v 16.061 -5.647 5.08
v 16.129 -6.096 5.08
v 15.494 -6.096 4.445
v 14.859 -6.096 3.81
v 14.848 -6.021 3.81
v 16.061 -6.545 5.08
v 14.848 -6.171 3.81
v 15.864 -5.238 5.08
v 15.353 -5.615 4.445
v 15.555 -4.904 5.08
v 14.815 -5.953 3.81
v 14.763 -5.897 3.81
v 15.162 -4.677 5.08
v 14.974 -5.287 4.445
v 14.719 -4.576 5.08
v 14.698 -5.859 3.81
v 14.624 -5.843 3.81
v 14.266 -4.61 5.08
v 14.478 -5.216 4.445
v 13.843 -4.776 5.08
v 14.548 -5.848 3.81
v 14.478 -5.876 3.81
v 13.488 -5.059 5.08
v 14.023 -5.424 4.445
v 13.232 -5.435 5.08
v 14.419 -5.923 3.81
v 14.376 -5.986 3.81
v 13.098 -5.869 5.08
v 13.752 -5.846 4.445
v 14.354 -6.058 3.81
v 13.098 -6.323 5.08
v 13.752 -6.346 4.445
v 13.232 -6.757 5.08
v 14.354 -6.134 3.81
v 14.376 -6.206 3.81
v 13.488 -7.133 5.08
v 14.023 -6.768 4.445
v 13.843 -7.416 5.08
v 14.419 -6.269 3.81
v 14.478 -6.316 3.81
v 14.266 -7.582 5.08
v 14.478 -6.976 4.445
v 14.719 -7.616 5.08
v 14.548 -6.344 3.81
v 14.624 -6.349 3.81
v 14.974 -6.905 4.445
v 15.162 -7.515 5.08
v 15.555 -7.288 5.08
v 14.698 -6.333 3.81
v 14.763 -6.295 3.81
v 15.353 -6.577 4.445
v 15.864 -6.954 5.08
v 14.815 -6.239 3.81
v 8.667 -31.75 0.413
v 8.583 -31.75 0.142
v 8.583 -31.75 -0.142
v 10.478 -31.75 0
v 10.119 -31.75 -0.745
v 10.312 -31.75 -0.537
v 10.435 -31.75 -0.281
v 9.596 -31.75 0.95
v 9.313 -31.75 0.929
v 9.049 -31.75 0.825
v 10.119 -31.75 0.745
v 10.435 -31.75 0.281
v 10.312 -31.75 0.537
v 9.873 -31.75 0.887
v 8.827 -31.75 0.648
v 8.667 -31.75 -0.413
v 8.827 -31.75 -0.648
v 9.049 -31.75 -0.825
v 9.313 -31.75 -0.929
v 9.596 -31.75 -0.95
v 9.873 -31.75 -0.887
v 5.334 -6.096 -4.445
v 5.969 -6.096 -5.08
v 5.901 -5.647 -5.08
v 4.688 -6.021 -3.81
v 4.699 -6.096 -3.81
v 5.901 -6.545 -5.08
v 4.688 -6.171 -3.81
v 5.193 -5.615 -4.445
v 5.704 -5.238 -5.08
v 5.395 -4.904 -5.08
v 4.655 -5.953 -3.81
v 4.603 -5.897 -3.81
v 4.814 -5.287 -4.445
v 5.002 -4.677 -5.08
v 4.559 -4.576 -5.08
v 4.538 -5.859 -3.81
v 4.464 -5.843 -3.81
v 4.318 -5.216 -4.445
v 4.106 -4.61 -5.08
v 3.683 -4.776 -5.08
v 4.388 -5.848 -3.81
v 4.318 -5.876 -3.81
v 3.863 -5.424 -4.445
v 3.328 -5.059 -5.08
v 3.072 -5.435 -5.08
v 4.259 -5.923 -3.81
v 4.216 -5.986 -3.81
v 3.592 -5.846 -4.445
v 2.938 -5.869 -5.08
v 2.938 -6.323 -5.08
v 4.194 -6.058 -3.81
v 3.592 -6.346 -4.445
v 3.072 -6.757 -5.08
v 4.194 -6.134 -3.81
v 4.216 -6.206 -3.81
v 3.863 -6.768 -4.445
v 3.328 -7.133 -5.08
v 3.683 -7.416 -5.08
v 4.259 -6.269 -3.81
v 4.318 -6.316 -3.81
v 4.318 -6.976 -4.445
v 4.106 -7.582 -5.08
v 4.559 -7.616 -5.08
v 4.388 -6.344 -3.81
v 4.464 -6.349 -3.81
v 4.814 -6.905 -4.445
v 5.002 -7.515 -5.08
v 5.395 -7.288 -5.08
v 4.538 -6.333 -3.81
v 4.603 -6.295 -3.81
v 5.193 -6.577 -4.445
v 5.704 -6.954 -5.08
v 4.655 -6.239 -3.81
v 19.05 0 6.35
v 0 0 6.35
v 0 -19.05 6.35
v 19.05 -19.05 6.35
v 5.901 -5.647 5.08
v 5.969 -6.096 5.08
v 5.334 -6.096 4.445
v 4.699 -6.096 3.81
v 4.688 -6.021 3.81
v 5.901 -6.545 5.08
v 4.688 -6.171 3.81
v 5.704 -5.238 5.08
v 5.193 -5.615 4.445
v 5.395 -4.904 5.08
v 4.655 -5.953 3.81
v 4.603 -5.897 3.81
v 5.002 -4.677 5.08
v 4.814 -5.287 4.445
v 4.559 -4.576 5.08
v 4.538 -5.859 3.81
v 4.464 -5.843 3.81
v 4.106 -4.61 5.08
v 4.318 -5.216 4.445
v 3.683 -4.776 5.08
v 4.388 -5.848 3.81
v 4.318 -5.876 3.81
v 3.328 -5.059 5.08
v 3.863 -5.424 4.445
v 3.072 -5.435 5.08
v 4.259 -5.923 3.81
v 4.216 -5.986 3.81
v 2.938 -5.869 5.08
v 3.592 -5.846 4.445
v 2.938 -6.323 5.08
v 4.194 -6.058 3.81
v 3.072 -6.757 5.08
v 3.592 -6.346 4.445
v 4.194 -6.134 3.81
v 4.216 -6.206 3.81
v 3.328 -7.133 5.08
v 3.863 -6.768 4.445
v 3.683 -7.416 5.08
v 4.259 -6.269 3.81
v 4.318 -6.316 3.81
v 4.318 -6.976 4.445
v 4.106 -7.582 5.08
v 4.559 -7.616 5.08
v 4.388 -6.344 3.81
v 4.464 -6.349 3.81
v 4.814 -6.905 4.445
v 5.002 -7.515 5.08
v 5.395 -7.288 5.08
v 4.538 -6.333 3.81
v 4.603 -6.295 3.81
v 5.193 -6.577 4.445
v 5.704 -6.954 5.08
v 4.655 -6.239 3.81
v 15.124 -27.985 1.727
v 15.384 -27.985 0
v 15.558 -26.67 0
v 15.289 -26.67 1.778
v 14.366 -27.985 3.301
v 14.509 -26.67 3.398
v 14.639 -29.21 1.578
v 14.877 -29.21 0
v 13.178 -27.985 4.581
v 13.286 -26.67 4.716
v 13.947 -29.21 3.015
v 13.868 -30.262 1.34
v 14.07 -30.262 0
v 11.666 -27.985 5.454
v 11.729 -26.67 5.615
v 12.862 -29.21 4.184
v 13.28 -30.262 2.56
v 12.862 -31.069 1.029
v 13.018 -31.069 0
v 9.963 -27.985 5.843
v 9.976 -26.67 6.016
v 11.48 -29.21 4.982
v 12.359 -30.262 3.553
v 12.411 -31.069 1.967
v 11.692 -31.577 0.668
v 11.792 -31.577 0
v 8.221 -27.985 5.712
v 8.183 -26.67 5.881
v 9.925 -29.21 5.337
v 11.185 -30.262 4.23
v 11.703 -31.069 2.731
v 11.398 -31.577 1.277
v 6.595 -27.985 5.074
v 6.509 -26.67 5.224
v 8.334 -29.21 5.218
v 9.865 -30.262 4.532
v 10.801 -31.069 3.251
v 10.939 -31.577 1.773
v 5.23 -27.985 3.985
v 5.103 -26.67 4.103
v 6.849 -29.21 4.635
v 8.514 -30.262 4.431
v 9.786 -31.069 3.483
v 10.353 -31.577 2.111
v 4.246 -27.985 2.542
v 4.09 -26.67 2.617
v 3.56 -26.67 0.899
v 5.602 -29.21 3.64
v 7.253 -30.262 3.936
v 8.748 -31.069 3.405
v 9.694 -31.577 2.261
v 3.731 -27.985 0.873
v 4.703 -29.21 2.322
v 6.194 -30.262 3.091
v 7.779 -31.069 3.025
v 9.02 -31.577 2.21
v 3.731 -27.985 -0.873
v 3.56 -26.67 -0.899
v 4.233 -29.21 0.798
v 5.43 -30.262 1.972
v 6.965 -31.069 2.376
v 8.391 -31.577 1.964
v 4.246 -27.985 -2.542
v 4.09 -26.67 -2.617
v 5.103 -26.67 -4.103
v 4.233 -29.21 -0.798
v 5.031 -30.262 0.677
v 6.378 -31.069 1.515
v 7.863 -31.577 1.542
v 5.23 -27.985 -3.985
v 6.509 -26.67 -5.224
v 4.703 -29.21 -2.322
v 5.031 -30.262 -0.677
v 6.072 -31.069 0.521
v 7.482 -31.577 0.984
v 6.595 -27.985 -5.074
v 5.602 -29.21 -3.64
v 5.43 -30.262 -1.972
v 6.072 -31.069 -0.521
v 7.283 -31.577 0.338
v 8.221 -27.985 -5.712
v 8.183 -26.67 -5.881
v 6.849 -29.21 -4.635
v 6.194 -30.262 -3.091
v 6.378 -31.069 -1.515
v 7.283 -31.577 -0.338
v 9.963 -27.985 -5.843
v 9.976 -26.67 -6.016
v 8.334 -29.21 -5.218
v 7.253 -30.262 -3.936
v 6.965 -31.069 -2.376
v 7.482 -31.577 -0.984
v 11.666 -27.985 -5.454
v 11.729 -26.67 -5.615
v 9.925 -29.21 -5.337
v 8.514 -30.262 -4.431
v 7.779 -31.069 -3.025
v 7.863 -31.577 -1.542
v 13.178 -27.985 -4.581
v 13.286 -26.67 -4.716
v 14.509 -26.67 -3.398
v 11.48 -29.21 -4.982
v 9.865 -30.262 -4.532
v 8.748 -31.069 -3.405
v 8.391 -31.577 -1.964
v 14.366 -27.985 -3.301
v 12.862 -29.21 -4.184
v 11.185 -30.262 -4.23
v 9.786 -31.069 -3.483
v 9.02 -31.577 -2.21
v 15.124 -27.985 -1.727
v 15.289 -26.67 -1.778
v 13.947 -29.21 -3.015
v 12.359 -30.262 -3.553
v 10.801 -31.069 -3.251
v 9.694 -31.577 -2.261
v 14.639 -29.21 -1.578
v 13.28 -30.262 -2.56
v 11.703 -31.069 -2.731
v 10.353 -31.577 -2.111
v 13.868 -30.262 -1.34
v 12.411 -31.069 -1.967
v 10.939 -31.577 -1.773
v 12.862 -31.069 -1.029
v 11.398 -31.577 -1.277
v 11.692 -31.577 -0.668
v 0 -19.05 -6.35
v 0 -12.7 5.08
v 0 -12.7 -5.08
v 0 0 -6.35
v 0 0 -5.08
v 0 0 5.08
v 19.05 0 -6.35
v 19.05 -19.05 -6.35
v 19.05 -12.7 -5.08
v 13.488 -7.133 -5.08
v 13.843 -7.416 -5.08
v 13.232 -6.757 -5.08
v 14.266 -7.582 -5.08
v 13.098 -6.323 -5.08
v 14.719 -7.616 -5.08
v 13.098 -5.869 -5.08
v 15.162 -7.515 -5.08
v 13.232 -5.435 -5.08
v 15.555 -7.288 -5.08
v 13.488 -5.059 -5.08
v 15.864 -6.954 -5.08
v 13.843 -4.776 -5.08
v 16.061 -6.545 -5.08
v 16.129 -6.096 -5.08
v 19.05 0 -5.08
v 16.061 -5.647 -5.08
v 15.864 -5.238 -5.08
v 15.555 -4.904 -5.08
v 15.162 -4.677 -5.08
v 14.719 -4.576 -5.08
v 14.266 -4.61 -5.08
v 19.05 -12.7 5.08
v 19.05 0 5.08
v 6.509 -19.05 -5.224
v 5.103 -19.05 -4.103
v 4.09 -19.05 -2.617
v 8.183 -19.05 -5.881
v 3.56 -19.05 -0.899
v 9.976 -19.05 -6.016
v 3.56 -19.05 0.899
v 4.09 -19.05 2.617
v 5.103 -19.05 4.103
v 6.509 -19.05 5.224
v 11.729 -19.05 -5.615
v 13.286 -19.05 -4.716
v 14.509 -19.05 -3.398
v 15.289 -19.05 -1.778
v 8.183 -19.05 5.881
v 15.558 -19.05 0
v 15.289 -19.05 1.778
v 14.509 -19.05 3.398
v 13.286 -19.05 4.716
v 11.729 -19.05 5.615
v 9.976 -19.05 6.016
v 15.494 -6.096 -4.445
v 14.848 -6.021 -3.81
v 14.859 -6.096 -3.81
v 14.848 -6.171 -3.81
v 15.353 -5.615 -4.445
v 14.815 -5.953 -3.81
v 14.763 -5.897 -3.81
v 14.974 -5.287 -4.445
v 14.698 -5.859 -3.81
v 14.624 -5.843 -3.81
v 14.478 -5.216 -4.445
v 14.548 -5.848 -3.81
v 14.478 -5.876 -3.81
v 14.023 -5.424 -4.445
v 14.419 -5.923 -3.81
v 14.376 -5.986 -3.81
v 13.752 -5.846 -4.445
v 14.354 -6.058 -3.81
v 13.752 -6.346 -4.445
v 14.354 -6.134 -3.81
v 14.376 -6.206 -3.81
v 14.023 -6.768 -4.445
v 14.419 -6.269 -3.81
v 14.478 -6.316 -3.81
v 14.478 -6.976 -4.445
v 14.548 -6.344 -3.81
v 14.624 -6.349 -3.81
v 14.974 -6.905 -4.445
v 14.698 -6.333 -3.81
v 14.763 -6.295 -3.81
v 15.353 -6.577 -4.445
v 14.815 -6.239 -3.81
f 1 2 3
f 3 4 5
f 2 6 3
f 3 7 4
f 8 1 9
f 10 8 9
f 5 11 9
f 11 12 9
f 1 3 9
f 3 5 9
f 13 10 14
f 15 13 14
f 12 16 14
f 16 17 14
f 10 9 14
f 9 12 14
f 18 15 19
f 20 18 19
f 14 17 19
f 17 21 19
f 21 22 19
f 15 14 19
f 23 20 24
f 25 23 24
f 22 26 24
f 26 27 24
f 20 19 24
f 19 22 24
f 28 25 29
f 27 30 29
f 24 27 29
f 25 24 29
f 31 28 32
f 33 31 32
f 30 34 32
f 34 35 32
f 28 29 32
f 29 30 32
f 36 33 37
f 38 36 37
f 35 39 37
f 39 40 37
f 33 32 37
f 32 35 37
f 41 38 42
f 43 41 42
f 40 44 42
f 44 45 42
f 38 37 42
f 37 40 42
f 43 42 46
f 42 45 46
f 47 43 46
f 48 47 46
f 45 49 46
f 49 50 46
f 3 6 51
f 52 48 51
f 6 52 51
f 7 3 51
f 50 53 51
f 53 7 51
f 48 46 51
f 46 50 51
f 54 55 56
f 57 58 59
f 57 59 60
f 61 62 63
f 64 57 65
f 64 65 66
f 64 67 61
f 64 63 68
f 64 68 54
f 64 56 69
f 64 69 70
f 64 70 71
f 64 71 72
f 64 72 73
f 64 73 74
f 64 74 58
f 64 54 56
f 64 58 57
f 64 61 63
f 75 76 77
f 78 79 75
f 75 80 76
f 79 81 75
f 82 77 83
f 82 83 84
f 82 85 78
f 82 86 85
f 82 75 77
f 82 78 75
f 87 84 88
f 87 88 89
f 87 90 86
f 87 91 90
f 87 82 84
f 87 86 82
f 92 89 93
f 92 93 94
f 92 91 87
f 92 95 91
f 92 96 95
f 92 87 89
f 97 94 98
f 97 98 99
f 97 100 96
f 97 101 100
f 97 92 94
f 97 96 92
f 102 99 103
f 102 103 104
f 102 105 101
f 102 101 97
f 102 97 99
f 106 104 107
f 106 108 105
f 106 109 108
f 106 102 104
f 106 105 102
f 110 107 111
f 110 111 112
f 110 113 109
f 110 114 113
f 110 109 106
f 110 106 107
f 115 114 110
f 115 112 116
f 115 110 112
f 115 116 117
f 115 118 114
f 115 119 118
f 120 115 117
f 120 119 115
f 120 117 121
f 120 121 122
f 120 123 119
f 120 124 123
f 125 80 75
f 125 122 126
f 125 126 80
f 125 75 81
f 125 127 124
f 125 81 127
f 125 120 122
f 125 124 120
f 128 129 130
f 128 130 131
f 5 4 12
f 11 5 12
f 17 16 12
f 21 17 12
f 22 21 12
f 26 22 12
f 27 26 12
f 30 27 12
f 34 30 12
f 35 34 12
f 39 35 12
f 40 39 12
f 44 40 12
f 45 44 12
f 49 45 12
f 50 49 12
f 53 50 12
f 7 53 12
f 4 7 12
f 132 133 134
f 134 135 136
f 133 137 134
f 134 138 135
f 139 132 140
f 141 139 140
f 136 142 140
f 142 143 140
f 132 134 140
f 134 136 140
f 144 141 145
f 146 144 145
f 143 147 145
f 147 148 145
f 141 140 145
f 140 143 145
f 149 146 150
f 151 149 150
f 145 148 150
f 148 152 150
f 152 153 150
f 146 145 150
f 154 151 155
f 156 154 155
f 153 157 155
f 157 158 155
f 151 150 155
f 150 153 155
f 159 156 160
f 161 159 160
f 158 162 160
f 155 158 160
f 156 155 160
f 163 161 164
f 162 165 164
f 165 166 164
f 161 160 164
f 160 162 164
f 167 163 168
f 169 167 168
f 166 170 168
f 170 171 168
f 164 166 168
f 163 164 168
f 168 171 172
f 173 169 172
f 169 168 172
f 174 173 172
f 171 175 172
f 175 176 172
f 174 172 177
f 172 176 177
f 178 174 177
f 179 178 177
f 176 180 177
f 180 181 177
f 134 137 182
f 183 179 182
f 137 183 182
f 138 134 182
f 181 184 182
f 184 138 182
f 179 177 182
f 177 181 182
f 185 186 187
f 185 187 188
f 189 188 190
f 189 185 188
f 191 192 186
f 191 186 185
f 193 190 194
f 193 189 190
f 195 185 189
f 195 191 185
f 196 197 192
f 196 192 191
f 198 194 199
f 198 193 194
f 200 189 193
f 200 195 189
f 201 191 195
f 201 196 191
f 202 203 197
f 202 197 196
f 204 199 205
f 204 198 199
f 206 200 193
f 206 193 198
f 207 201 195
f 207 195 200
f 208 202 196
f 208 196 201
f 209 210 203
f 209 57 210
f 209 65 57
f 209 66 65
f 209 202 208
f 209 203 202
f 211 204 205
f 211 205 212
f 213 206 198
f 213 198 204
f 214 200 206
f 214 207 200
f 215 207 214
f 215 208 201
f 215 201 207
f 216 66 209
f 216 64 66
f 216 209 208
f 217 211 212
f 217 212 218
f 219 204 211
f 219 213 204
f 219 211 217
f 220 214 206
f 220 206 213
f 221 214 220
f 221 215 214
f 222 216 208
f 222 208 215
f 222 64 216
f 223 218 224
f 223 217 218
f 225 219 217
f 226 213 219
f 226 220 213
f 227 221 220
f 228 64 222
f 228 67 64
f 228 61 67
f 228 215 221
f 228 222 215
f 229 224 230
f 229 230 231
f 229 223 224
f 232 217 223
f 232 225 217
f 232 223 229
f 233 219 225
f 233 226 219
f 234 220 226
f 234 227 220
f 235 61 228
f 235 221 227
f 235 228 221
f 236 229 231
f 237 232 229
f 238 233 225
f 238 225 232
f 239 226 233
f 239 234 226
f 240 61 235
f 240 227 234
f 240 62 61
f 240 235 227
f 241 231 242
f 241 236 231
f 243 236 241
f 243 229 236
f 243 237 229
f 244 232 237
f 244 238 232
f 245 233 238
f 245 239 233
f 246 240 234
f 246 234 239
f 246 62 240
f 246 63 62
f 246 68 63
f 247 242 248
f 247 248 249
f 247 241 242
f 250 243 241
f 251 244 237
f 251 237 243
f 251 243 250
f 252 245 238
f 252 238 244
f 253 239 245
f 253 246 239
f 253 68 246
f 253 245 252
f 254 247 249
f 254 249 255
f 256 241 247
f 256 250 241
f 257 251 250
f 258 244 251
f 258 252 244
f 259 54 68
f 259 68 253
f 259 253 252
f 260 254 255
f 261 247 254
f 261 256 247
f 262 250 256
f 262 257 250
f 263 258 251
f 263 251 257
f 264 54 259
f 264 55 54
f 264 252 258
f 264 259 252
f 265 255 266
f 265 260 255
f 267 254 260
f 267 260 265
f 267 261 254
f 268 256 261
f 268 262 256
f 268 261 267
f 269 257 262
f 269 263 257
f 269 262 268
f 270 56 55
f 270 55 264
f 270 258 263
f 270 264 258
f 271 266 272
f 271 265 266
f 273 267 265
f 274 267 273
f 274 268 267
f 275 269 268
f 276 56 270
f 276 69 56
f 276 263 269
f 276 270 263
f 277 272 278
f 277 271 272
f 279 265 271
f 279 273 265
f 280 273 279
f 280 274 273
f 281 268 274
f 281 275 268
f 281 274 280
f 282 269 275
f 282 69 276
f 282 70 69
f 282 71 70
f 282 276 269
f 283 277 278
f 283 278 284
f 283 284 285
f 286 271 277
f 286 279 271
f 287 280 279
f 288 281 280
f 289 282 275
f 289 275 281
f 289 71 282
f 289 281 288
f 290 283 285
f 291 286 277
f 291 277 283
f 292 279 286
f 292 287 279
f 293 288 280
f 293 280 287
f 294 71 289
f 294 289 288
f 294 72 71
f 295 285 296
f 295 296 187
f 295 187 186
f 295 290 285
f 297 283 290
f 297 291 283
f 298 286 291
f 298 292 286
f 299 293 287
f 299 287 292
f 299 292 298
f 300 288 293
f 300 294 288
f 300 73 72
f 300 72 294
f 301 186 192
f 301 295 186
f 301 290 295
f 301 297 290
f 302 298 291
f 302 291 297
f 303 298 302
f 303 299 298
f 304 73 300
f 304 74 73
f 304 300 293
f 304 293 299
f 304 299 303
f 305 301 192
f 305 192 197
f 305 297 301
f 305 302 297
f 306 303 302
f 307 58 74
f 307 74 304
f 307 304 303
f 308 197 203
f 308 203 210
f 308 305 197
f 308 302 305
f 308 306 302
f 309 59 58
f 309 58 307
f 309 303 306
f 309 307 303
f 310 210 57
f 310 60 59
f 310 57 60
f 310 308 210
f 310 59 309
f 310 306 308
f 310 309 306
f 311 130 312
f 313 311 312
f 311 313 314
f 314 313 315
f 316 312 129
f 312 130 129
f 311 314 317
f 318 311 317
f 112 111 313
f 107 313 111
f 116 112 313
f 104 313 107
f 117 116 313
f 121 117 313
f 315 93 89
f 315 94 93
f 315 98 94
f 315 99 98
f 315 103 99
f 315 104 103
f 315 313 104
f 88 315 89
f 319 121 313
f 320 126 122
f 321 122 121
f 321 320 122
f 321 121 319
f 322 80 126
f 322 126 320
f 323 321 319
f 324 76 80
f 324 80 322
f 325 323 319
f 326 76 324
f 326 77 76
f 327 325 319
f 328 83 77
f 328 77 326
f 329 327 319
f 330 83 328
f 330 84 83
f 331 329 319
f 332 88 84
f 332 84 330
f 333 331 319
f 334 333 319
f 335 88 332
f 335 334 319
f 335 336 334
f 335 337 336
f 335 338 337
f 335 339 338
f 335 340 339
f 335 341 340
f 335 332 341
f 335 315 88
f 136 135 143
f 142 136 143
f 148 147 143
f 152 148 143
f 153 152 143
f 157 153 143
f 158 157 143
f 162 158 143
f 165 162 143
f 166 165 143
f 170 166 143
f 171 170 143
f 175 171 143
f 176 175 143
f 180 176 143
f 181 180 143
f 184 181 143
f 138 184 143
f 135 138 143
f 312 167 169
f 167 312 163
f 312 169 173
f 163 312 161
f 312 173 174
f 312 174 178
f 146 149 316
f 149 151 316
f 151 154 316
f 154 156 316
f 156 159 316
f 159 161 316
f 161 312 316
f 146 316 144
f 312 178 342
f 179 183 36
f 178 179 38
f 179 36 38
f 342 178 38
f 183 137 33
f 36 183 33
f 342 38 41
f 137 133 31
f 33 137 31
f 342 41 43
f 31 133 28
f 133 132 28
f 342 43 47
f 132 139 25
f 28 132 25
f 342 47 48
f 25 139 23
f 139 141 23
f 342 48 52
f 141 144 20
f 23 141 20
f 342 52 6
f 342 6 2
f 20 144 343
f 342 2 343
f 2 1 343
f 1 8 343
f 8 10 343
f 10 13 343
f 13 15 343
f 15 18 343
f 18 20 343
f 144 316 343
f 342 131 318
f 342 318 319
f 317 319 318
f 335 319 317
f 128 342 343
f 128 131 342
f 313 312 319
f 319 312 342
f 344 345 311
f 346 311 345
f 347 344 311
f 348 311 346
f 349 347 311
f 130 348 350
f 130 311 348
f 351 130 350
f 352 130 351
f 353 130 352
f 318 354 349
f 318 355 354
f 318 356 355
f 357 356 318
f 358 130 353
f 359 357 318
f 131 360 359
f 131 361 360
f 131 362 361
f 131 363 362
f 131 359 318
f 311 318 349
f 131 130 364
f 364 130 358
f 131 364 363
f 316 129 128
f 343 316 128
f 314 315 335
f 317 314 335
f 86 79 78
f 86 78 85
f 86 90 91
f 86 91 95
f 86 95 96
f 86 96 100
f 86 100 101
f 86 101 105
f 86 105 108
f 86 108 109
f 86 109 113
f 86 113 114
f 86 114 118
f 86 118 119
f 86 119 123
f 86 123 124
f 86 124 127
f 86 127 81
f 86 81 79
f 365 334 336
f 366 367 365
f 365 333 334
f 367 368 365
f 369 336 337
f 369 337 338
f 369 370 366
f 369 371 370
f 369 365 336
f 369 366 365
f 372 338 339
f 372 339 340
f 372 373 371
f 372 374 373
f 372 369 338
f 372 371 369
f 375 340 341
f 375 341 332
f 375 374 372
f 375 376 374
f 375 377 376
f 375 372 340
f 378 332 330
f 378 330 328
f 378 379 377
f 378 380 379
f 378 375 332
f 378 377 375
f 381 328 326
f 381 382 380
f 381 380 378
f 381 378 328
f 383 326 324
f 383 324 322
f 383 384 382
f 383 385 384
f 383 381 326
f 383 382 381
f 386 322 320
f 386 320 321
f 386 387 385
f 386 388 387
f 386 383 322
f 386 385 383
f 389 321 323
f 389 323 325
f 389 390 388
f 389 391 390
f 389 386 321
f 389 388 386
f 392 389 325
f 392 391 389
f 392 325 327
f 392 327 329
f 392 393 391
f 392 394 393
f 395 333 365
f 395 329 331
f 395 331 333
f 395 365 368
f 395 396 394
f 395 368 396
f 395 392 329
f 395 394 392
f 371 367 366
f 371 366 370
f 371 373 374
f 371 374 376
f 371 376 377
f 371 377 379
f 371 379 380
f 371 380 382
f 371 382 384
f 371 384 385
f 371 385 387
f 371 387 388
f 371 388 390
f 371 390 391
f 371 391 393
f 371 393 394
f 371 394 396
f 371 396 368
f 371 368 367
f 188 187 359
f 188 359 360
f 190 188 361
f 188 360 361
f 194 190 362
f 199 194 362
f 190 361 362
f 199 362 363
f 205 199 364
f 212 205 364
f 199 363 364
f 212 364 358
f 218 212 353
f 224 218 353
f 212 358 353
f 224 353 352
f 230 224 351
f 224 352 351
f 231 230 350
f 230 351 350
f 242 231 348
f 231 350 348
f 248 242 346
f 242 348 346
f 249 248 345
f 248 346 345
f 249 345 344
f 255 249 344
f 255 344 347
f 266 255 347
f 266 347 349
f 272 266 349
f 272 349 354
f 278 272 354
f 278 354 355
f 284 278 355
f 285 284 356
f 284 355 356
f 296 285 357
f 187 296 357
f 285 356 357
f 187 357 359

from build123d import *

# Parameters (mm, degrees)
SKETCH1_W                = 19.05
SKETCH1_H                = 19.05
BOSS_EXTRUDE1_DEPTH      = 6.35
SKETCH2_W                = 19.05
SKETCH2_H                = 12.7
CUT_EXTRUDE1_DEPTH       = 5.08
SKETCH3_R                = 1.524
BOSS_EXTRUDE2_DEPTH      = 1.27
CHAMFER1_SIZE            = 1.27
CHAMFER1_OF_MIRROR1_SIZE = 1.27
SKETCH4_R                = 6.0325
BOSS_EXTRUDE3_DEPTH      = 12.7
FILLET1_R                = 5.08


with BuildPart() as part:
    # Sketch1 → Boss-Extrude1 (new, symmetric)
    with BuildSketch(Plane.XY):
        with Locations((9.525, -9.525)):
            Rectangle(SKETCH1_W, SKETCH1_H)
    extrude(amount=BOSS_EXTRUDE1_DEPTH, both=True)

    # Sketch2 → Cut-Extrude1 (cut, symmetric)
    with BuildSketch(Plane.XY):
        with Locations((9.525, -6.35)):
            Rectangle(SKETCH2_W, SKETCH2_H)
    extrude(amount=CUT_EXTRUDE1_DEPTH, both=True, mode=Mode.SUBTRACT)

    # Sketch3 → Boss-Extrude2 (add)
    with BuildSketch(Plane.XY.offset(-5.08)):
        with Locations((14.605, -6.096)):
            Circle(SKETCH3_R)
        with Locations((4.445, -6.096)):
            Circle(SKETCH3_R)
    boss_extrude2 = extrude(amount=BOSS_EXTRUDE2_DEPTH)

    # Chamfer1
    chamfer1_edges = [part.edges().sort_by_distance(p)[0] for p in [
        (13.081, -6.096, -3.81),
        (2.921, -6.096, -3.81),
    ]]
    chamfer(chamfer1_edges, length=CHAMFER1_SIZE - 0.0001)  # a hair under: the kernel refuses the full size

    # Mirror1: Boss-Extrude2 across plane
    add(boss_extrude2.mirror(Plane.XY))

    # Chamfer1 of Mirror1
    chamfer1_of_mirror1_edges = [part.edges().sort_by_distance(p)[0] for p in [
        (13.081, -6.096, 3.81),
        (2.921, -6.096, 3.81),
    ]]
    chamfer(chamfer1_of_mirror1_edges, length=CHAMFER1_OF_MIRROR1_SIZE - 0.0001)  # a hair under: the kernel refuses the full size

    # Sketch4 → Boss-Extrude3 (add)
    with BuildSketch(Plane.XZ.offset(19.05)):
        with Locations((9.525, 0)):
            Circle(SKETCH4_R)
    extrude(amount=BOSS_EXTRUDE3_DEPTH)

    # Fillet1
    fillet1_edges = [part.edges().sort_by_distance(p)[0] for p in [
        (3.4925, -31.75, 0),
    ]]
    fillet(fillet1_edges, radius=FILLET1_R)


solid = part.part
